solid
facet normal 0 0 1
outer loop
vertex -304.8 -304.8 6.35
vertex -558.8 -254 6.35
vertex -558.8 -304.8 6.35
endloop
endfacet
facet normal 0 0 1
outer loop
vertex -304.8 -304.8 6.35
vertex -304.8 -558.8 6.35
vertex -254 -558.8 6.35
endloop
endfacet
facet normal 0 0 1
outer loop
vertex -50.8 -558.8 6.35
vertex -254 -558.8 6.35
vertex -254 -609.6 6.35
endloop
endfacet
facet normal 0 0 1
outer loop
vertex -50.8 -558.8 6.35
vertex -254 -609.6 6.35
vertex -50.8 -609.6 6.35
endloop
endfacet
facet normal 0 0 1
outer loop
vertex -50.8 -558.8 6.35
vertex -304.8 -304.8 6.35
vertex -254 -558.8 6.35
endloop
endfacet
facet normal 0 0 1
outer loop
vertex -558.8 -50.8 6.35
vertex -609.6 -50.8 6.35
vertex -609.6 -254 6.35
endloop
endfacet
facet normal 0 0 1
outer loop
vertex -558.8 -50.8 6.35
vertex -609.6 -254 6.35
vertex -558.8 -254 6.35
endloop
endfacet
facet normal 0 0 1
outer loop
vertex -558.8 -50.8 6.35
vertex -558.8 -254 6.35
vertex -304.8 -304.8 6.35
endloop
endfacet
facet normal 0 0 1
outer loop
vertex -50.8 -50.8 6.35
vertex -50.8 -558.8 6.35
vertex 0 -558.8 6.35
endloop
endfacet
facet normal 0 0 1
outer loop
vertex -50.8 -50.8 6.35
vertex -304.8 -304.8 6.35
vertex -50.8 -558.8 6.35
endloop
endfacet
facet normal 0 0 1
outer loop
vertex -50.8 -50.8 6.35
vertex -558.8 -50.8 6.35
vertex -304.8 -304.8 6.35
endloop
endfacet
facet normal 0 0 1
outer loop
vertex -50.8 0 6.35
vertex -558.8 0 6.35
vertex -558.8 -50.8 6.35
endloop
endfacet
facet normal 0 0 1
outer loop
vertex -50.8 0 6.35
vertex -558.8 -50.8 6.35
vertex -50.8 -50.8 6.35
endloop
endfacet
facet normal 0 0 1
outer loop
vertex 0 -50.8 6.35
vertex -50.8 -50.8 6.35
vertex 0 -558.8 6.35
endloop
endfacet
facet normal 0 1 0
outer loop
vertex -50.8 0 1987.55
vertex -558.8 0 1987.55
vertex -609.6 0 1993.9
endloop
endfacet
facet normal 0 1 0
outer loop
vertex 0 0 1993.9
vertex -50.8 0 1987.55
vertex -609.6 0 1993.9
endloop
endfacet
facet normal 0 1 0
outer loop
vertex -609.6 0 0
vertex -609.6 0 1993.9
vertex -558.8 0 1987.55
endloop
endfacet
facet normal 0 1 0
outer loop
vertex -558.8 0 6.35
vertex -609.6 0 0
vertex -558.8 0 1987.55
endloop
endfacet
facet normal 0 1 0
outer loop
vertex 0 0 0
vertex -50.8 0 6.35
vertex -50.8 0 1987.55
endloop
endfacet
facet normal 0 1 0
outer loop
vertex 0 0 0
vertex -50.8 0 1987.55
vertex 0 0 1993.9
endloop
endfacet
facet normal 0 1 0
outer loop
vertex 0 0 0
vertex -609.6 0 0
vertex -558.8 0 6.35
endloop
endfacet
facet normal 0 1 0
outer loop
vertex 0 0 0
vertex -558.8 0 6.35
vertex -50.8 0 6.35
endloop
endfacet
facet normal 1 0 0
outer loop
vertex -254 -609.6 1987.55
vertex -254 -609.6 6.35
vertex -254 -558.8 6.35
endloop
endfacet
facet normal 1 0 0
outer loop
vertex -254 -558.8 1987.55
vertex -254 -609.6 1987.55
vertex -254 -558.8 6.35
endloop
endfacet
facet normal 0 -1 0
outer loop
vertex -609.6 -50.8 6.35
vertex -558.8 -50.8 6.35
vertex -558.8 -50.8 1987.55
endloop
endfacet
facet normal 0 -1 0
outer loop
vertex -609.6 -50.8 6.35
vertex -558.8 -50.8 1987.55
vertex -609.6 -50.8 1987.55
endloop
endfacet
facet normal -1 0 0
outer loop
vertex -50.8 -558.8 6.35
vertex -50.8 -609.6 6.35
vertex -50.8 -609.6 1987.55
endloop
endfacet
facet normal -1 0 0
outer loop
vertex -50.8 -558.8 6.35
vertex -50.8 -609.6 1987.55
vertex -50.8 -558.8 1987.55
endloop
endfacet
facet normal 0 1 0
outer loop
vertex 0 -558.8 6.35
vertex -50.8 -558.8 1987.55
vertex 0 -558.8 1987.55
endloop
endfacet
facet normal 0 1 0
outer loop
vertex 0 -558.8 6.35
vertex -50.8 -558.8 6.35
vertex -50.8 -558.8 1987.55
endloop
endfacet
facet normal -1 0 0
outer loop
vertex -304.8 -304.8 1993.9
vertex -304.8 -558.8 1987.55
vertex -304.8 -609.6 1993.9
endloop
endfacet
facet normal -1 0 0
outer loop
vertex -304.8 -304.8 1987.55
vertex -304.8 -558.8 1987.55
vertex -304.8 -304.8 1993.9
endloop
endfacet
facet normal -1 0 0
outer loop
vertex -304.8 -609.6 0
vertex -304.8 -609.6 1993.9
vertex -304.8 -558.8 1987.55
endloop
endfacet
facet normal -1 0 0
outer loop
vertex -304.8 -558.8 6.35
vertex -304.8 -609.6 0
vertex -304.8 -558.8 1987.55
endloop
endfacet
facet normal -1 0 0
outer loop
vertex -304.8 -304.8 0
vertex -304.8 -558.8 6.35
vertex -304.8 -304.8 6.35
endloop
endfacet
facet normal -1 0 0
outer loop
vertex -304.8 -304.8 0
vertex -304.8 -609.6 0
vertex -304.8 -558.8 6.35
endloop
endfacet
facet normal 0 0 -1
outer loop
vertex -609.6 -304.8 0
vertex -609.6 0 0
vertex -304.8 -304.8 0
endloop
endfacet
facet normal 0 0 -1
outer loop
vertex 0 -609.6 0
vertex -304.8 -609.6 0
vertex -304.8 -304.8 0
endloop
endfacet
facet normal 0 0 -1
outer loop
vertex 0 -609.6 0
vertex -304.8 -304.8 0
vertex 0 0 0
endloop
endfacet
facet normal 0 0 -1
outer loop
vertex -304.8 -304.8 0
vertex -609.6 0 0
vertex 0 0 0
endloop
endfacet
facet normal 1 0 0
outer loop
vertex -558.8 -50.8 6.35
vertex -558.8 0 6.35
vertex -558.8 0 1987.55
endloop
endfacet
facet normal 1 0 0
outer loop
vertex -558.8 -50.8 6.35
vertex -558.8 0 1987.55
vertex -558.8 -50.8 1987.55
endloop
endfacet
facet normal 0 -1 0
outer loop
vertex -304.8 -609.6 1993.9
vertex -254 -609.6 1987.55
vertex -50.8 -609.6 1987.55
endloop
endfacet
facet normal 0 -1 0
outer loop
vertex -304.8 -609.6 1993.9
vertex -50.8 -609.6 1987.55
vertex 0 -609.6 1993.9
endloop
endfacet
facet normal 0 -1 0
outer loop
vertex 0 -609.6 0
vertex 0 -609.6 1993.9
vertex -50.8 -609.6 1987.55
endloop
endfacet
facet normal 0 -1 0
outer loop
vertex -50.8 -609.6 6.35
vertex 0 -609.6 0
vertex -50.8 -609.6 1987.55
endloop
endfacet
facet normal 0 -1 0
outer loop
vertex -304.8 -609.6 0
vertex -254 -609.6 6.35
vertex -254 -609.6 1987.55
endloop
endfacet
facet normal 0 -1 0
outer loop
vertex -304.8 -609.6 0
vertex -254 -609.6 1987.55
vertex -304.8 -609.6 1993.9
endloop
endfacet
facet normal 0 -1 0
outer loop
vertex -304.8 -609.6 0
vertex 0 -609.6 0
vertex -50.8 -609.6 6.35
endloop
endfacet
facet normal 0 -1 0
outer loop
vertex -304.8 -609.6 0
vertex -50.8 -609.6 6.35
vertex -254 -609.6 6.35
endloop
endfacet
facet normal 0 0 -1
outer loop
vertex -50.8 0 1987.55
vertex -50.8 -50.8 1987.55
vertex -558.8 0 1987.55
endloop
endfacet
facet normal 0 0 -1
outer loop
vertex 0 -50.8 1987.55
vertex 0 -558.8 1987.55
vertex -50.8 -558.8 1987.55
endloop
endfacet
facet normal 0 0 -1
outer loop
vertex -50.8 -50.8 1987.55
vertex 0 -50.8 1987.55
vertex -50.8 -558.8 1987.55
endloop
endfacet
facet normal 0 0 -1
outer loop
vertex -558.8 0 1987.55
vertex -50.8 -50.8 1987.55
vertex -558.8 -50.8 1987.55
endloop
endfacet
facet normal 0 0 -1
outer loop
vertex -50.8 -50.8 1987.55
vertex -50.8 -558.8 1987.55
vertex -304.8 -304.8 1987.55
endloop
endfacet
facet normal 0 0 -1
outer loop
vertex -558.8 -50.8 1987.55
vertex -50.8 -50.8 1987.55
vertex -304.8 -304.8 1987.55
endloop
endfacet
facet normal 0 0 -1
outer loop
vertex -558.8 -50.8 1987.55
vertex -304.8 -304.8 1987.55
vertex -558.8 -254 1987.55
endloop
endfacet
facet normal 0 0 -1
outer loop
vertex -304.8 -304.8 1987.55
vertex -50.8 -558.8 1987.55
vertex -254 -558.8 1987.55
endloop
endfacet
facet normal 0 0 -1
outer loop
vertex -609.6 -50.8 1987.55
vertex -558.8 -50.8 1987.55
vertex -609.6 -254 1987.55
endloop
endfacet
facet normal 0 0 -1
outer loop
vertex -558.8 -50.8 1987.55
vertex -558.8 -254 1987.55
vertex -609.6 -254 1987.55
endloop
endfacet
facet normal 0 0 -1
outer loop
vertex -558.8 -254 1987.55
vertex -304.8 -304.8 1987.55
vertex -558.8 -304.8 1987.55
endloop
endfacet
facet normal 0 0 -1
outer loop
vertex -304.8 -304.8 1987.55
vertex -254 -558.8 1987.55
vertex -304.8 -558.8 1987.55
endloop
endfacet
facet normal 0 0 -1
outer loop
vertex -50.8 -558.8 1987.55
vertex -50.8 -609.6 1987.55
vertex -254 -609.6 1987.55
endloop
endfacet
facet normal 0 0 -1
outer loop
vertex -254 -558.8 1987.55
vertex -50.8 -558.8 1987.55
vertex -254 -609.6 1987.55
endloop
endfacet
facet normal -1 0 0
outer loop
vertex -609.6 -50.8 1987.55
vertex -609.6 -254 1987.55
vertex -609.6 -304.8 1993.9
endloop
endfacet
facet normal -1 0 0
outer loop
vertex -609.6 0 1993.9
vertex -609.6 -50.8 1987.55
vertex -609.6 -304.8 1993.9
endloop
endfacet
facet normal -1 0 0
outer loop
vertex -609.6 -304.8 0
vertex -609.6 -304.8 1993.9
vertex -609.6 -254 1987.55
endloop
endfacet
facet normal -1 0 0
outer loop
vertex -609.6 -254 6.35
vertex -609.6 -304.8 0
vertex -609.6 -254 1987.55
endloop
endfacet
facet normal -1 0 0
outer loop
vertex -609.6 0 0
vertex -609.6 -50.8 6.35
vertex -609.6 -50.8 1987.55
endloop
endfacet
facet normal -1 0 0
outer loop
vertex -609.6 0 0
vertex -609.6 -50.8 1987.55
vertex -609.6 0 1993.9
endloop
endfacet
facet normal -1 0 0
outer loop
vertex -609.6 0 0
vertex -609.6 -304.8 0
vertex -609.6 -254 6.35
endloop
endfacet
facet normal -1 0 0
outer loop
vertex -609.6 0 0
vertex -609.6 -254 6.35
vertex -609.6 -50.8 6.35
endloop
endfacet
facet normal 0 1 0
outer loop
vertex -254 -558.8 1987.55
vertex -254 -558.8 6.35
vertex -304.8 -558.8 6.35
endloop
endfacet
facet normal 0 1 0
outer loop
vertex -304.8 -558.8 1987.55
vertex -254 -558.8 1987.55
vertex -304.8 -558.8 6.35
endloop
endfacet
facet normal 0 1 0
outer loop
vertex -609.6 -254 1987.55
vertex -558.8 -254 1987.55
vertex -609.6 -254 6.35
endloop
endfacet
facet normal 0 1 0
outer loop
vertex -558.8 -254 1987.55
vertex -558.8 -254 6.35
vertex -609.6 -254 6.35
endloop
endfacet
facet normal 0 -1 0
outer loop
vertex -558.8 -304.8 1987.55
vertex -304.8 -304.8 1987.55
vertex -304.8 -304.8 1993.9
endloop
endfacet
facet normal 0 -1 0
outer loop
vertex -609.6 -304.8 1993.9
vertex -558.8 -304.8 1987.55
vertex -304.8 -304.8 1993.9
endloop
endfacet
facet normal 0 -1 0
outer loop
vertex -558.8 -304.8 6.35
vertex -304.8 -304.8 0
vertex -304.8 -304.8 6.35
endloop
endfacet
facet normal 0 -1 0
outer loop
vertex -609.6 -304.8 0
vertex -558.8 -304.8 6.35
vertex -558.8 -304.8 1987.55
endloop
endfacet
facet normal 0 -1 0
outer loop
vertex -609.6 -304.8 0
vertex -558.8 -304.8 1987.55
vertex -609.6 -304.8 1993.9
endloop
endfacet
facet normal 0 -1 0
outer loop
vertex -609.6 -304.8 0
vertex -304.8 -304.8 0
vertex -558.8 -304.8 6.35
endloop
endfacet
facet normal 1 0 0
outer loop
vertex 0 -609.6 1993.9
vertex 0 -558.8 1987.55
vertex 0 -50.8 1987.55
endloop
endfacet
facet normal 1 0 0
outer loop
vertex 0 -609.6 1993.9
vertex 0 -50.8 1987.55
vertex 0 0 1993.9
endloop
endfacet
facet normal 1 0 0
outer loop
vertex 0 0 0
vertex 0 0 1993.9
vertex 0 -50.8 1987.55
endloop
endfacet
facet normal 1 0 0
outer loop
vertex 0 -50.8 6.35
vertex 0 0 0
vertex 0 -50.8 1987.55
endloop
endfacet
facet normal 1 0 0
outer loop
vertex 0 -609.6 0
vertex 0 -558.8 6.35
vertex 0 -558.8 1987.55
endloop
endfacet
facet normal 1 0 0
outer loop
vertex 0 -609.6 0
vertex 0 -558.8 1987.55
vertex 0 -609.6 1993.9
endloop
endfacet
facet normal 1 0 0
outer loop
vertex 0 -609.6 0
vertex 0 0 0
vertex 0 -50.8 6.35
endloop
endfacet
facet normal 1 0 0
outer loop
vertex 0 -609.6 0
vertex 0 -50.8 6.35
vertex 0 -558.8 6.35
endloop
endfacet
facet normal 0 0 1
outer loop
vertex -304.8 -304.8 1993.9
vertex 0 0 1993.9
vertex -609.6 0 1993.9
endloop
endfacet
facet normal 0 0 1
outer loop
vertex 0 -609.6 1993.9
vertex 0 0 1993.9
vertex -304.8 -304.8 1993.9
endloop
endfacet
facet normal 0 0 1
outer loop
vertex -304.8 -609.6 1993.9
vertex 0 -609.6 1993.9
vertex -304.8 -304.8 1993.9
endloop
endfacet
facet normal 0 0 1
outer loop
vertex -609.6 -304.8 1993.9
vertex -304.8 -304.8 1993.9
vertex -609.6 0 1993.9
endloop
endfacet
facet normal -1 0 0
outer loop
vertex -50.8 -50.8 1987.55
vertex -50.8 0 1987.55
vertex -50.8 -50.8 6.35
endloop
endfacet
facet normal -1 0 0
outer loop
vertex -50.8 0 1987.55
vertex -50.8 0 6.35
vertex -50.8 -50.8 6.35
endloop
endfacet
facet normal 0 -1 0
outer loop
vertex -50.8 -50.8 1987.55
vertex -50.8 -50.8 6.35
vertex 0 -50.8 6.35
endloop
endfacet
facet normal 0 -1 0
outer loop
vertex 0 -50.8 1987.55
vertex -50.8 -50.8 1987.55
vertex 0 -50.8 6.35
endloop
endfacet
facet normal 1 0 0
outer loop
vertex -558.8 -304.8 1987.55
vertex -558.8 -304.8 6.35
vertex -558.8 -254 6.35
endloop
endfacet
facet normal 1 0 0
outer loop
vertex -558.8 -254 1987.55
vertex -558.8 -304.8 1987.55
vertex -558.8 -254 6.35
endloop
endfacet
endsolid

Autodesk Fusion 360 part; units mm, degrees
sketch "Sketch1" plane through (0, 0, 0) normal (0, 0, 1) x (1, 0, 0)
  line L0 (0, 0) -> (0, -609.6)
  line L1 (0, -609.6) -> (-304.8, -609.6)
  line L2 (-304.8, -609.6) -> (-304.8, -304.8)
  line L3 (-304.8, -304.8) -> (-609.6, -304.8)
  line L4 (-609.6, -304.8) -> (-609.6, 0)
  line L5 (-609.6, 0) -> (0, 0)
  line L6 (-403.5828, -304.8) -> (-304.8, -403.5828) construction
  line L7 (-354.1914, -354.1914) -> (0, 0) construction
  dimension "d1" = 609.6
  dimension "d2" = 609.6
  dimension "d3" = 304.8
  dimension "d4" = 304.8
  dimension "d17" = 135
  dimension "d18" = 139.7
extrude "Extrude1" add sketch "Sketch1" along normal blind 6.35
sketch "Sketch2" plane through (0, 0, 6.35) normal (0, 0, 1) x (-1, 0, 0)
  line L0 (609.6, 0) -> (609.6, 304.8)
  line L1 (609.6, 304.8) -> (304.8, 304.8)
  line L2 (304.8, 304.8) -> (304.8, 609.6)
  line L3 (304.8, 609.6) -> (0, 609.6)
  line L4 (0, 609.6) -> (0, 0)
  line L5 (0, 0) -> (609.6, 0)
  line L6 (304.8, 609.6) -> (254, 609.6)
  line L7 (254, 609.6) -> (254, 558.8)
  line L8 (254, 558.8) -> (304.8, 558.8)
  line L9 (304.8, 558.8) -> (304.8, 609.6)
  line L10 (0, 609.6) -> (50.8, 609.6)
  line L11 (50.8, 609.6) -> (50.8, 558.8)
  line L12 (50.8, 558.8) -> (0, 558.8)
  line L13 (0, 558.8) -> (0, 609.6)
  line L14 (0, 0) -> (50.8, 0)
  line L15 (50.8, 0) -> (50.8, 50.8)
  line L16 (50.8, 50.8) -> (0, 50.8)
  line L17 (0, 50.8) -> (0, 0)
  line L18 (609.6, 0) -> (558.8, 0)
  line L19 (558.8, 0) -> (558.8, 50.8)
  line L20 (558.8, 50.8) -> (609.6, 50.8)
  line L21 (609.6, 50.8) -> (609.6, 0)
  line L22 (609.6, 304.8) -> (558.8, 304.8)
  line L23 (558.8, 304.8) -> (558.8, 254)
  line L24 (558.8, 254) -> (609.6, 254)
  line L25 (609.6, 254) -> (609.6, 304.8)
  dimension "d7" = 50.8
  dimension "d8" = 50.8
  dimension "d9" = 50.8
  dimension "d10" = 50.8
  dimension "d11" = 50.8
  dimension "d12" = 50.8
extrude "Extrude2" add sketch "Sketch2" along normal blind 1981.2 contours L0 L5 L18 L19 L20 L21 | L0 L1 L22 L23 L24 L25 | L4 L5 L14 L15 L16 L17 | L3 L4 L10 L11 L12 L13 | L2 L3 L6 L7 L8 L9
sketch "Sketch3" plane through (0, 0, 1987.55) normal (0, 0, 1) x (-1, 0, 0)
  line L0 (0, 558.8) -> (50.8, 558.8)
  line L1 (50.8, 558.8) -> (50.8, 609.6)
  line L2 (50.8, 609.6) -> (0, 609.6)
  line L3 (0, 609.6) -> (0, 558.8)
  line L4 (0, 609.6) -> (0, 0)
  line L5 (0, 609.6) -> (304.8, 609.6)
  line L6 (304.8, 609.6) -> (304.8, 304.8)
  line L7 (304.8, 304.8) -> (609.6, 304.8)
  line L8 (609.6, 304.8) -> (609.6, 0)
  line L9 (609.6, 0) -> (0, 0)
  point P0 (304.8, 609.6)
  point P1 (609.6, 304.8)
extrude "Extrude3" add sketch "Sketch3" along normal blind 6.35
